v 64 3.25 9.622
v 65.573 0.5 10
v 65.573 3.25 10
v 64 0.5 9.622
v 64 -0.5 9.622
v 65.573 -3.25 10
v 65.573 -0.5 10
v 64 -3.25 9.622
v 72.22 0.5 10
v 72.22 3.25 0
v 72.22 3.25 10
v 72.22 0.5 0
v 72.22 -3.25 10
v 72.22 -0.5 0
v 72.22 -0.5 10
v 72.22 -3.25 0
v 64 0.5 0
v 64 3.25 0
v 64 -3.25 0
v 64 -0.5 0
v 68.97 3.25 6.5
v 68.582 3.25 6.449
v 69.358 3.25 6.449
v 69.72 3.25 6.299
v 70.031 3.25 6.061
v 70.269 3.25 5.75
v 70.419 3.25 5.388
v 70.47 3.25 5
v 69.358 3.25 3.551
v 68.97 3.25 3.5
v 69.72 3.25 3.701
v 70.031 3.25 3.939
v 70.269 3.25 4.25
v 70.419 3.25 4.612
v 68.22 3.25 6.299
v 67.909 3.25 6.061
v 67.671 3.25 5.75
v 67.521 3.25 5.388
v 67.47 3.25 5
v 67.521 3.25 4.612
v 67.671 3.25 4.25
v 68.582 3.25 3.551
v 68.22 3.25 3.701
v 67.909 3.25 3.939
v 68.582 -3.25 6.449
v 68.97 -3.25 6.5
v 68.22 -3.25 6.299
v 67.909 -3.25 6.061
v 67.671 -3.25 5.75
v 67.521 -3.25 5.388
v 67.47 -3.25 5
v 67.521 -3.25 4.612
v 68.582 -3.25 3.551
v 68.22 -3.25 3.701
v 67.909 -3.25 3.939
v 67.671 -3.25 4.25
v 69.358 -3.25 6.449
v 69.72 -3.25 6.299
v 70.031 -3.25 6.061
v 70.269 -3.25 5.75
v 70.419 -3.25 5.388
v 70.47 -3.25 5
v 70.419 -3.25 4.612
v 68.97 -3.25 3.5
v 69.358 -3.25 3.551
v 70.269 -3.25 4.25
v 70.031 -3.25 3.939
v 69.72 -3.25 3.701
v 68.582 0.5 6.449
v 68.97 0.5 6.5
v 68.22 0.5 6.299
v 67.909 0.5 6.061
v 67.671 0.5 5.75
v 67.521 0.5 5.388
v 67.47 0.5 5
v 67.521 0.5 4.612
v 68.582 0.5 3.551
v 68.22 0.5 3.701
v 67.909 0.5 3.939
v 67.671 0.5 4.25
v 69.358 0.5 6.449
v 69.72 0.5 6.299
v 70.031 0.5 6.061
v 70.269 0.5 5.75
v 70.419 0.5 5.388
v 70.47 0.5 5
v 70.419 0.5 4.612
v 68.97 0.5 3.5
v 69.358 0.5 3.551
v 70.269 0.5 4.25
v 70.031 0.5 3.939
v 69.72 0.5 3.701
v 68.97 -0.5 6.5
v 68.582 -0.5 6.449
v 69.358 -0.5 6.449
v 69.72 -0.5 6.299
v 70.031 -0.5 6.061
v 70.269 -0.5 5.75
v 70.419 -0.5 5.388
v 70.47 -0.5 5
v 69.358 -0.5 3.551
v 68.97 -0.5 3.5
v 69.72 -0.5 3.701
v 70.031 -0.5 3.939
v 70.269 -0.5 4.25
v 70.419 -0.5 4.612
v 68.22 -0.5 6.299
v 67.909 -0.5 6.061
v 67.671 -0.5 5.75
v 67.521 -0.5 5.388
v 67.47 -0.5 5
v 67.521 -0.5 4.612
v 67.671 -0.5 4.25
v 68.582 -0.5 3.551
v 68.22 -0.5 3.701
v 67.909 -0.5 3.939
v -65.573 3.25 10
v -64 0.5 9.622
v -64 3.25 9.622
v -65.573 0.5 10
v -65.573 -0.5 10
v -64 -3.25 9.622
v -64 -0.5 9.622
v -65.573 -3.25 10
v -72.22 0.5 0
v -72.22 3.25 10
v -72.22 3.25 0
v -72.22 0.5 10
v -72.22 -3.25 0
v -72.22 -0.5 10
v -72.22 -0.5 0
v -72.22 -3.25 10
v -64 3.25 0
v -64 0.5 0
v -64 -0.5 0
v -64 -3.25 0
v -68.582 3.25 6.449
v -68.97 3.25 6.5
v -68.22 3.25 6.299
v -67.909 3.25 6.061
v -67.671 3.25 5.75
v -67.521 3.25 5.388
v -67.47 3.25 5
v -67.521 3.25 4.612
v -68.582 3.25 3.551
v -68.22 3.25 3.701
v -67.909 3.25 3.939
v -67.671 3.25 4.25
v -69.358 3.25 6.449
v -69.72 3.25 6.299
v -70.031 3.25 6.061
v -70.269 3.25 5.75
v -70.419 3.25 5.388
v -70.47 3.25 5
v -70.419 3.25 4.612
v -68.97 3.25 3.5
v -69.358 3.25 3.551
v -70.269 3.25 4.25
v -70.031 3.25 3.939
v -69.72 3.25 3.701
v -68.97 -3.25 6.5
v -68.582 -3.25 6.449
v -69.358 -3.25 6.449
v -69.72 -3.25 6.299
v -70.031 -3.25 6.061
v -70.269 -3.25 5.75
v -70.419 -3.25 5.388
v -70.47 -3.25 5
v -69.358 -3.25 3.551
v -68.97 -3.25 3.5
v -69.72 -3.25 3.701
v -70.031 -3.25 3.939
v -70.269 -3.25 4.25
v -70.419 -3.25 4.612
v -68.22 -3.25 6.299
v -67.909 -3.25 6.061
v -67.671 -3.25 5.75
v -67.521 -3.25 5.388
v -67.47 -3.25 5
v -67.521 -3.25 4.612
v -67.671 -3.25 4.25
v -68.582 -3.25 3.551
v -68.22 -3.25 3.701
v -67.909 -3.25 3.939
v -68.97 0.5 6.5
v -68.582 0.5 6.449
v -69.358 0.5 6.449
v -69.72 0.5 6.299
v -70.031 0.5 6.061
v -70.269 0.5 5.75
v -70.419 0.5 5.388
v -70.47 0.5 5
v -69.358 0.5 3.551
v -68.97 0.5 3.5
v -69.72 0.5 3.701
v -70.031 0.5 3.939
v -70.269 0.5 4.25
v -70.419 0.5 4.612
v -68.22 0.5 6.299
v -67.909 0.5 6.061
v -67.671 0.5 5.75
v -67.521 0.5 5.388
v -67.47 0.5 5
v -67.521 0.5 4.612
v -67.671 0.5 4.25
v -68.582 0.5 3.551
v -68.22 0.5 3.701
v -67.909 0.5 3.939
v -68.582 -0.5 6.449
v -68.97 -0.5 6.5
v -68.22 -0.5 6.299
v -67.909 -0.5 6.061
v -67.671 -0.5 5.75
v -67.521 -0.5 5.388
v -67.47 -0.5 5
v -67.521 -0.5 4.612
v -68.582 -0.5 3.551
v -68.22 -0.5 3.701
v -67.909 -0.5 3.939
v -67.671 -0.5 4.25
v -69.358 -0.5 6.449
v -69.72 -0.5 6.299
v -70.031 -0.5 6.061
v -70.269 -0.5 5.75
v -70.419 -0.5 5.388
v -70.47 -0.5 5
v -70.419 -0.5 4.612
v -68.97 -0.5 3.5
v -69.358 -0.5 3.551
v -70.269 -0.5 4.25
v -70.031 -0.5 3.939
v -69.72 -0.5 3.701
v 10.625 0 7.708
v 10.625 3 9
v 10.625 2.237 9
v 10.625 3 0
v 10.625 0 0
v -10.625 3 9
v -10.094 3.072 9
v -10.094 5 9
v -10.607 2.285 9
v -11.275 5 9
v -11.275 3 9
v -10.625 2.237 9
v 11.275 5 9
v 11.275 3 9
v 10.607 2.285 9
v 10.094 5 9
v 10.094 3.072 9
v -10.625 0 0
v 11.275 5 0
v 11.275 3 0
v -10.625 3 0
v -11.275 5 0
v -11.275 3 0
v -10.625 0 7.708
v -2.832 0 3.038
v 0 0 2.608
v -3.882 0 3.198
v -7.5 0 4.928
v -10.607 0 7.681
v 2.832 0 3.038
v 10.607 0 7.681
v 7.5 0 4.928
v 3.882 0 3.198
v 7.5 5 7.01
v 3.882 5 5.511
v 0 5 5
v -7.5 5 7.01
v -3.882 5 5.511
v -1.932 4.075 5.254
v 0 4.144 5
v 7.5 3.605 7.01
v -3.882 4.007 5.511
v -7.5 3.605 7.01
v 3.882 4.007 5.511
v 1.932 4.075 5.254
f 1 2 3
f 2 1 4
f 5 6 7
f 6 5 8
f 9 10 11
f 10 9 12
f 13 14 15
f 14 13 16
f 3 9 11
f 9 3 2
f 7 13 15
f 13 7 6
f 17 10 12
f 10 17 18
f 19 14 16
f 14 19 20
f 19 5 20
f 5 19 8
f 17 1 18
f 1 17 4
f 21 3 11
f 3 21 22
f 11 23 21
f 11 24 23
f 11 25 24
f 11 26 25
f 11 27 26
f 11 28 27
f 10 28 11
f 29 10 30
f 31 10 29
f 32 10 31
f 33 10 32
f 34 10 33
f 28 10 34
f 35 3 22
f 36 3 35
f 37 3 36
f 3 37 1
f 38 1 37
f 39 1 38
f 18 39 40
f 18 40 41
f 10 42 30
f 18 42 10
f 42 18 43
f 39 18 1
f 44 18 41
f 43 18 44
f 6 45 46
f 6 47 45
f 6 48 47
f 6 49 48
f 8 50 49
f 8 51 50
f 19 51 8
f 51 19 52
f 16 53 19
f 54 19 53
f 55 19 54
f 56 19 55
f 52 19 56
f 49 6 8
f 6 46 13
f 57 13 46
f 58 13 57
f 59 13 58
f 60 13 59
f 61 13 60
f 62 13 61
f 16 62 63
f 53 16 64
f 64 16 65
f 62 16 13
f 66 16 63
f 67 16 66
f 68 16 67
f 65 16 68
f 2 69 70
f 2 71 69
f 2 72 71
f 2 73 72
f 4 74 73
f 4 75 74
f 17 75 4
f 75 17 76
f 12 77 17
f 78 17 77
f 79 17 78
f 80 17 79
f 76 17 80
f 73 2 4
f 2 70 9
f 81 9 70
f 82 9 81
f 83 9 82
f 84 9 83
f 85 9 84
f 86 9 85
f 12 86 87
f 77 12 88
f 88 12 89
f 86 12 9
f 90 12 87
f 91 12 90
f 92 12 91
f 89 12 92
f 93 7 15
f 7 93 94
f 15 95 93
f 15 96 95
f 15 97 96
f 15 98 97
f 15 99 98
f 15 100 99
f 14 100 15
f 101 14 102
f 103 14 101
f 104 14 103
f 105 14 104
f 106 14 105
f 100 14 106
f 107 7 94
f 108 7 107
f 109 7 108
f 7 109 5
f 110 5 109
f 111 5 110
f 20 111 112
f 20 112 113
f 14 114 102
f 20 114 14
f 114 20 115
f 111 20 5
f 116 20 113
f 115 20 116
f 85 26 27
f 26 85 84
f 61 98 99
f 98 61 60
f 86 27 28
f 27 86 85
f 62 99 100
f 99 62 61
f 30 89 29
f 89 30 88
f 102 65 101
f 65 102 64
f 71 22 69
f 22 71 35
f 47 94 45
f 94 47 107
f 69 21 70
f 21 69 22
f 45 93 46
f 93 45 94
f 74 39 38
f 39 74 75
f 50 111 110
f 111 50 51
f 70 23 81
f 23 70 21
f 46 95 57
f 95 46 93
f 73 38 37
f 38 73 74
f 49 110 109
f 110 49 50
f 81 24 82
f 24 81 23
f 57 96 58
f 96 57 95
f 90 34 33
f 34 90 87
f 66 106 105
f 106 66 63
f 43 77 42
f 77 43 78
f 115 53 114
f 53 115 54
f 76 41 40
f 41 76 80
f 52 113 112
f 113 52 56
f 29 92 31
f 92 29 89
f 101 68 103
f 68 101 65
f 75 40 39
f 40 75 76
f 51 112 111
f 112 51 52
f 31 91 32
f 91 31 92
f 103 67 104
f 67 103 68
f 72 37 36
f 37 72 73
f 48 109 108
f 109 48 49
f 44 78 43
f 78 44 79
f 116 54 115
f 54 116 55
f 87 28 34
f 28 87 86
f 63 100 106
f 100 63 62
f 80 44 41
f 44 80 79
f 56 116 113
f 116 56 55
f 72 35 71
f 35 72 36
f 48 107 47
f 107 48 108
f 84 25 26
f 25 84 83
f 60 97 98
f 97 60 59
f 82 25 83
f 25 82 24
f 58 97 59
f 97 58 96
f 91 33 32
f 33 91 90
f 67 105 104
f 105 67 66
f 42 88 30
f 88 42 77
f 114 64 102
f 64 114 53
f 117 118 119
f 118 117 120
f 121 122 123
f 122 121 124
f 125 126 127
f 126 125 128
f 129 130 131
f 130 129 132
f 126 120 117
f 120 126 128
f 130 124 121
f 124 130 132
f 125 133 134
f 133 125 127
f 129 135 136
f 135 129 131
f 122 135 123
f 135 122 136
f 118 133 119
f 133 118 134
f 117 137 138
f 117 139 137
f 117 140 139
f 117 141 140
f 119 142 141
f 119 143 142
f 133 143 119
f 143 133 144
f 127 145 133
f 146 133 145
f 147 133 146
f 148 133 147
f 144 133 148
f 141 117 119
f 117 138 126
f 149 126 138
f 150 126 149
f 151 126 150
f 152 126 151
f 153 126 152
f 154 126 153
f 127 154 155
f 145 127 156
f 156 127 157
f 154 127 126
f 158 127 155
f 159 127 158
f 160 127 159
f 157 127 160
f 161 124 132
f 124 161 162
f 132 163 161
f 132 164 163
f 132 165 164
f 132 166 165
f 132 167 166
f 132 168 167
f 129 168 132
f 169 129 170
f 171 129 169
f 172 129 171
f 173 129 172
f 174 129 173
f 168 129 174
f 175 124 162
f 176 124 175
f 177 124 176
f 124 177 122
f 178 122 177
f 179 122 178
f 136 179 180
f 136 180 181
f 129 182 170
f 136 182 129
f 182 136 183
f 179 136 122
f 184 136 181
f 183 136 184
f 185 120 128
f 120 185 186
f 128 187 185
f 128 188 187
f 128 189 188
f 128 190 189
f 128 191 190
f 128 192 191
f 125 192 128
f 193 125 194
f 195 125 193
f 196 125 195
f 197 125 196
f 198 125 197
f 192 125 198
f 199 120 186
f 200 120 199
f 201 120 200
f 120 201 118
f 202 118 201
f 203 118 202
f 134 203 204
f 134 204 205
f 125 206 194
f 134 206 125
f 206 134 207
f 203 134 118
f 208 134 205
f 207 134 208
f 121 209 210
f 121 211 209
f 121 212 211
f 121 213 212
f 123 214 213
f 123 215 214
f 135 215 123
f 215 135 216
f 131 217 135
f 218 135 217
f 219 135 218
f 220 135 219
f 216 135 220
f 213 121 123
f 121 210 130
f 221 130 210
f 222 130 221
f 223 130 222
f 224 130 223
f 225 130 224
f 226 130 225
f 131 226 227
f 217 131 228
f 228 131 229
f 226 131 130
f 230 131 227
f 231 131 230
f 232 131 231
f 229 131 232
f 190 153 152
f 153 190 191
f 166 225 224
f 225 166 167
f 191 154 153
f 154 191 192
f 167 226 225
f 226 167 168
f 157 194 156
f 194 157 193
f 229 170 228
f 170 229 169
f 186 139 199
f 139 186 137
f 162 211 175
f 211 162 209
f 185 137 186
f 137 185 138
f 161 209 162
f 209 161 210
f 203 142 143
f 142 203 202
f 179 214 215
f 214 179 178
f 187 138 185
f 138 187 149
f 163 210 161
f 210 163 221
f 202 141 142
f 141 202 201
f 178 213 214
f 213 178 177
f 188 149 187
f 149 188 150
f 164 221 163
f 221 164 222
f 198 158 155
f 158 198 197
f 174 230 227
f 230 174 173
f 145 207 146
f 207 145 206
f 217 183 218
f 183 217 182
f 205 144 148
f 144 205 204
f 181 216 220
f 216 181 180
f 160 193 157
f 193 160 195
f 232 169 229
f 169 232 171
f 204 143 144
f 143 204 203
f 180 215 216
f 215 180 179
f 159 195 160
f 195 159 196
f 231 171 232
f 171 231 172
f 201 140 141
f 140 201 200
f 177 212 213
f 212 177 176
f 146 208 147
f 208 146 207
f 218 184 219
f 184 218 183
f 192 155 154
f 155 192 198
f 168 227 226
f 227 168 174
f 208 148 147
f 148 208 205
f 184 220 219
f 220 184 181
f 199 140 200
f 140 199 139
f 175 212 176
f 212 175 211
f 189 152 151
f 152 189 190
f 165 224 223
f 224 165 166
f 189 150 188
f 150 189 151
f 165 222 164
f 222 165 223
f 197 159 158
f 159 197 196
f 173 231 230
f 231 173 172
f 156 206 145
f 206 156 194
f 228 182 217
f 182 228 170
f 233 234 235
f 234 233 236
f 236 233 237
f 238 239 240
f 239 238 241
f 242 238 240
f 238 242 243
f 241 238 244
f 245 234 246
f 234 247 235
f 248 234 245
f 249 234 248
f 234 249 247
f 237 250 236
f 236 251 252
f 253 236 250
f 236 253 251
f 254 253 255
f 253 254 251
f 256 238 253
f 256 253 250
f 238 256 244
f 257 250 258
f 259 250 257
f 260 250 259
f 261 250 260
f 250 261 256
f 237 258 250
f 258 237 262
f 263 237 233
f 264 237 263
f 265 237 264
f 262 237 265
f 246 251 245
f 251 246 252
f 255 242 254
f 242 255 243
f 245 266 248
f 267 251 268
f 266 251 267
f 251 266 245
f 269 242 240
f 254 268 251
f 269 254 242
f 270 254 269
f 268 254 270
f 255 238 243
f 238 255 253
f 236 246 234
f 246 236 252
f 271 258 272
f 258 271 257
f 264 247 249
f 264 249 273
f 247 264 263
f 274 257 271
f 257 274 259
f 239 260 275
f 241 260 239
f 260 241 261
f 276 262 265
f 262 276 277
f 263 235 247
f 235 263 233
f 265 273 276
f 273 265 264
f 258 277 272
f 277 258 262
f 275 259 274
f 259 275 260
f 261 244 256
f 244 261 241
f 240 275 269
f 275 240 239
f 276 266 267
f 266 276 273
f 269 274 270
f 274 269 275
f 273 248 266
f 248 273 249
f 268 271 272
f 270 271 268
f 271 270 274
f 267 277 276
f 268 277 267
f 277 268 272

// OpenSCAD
// Parameters that will be overwritten by command-line arguments
front_view = "default_front.dxf";  // Default DXF for front view
top_view = "default_top.dxf";      // Default DXF for top view
bridge_length = 20;                // Default bridge length

lensWidth = 54;
lensHeight = 36;

parameter_a = 1.5;
parameter_b = 1.5;
parameter_c = -11.95;
parameter_d = 0.22;

parameter_e = 9;
parameter_f = 47;
parameter_g = bridge_length;  // Use the user-defined bridge length
parameter_h = 1.3;

parameter_i = 100;

bbox_x = 0;
bbox_y = 0;

// Right lens
module lens() {
	
  linear_extrude(height=15)
      rotate([180,0,0])
          translate([-bbox_x,-bbox_y-15,0])
              import(front_view,$fn=250, layer="lens_outline");
		
}
    
module lens_case() {
	
  linear_extrude(height=20)
      rotate([180,0,0])
          translate([-bbox_x,-bbox_y-15,0])
              import(front_view,$fn=250);
		
}

module lens_assembly() {
  intersection() {
    difference() {
      union() {
        lens_case();
        translate([lensWidth, -6.5/2, 0])
          cube([parameter_a + parameter_d + 6.5, 6.5, 10]);
      }

      translate([0, 0, 1.5])
        scale([1, 1, 1.2])
          lens();

      translate([lensWidth/2, -1/2, -1])
        cube([lensWidth, 1, 10 + 2]);

      translate([lensWidth + parameter_a + parameter_d + 6.5/2, 0, 5])
        rotate([90, 0, 0])
          cylinder(d = 3, h = 25, $fn = 24, center = true);

      intersection() {
        translate([(lensWidth - parameter_e + parameter_a + parameter_d)/2 + parameter_e, 20, 10 + sqrt(pow(parameter_i, 2) - pow((lensWidth - parameter_e + parameter_a + parameter_d)/2, 2))])
          rotate([90, 0, 0])
            cylinder(r = parameter_i, h = 100, $fn=120);

        translate([parameter_e, -50, 0])
          cube([lensWidth - parameter_e + parameter_a + parameter_d, 100, 100]);
      }
    }

    union() {
      translate([-10, -10 + 2, -30/2 + 10 + 5])
        rotate([0, 90, 0])
          cylinder(d = 30, h = 20);
      translate([-10, -50, 0])
        cube([100, 100, 10]);
    }
  }
}

module bridge() {
	difference() {
		union() {
			translate([0,4,9/2])
				cube([bridge_length - parameter_a/2 + 2, 4, 9],center=true);
			translate([0,6,9/2])
				cube([bridge_length - parameter_a/2 + parameter_h + 2, 2, 9],center=true);
		}

		union() {
			translate([0,-10,15-2])
				rotate([-60,0,0])
					cylinder(r=15,h=20,$fn=24);

			translate([0,15,22-2])
				rotate([90,0,0])
					cylinder(r=15,h=20,$fn=24);
		}
	}
}

difference() {
	// Raw Frames
	union() {
    for (m = [0, 1])
      mirror([m, 0, 0])
        translate([bridge_length/2,0,0])
          lens_assembly();

		// Bridge
    translate([0, -2, 0])
      bridge();
	}
}
